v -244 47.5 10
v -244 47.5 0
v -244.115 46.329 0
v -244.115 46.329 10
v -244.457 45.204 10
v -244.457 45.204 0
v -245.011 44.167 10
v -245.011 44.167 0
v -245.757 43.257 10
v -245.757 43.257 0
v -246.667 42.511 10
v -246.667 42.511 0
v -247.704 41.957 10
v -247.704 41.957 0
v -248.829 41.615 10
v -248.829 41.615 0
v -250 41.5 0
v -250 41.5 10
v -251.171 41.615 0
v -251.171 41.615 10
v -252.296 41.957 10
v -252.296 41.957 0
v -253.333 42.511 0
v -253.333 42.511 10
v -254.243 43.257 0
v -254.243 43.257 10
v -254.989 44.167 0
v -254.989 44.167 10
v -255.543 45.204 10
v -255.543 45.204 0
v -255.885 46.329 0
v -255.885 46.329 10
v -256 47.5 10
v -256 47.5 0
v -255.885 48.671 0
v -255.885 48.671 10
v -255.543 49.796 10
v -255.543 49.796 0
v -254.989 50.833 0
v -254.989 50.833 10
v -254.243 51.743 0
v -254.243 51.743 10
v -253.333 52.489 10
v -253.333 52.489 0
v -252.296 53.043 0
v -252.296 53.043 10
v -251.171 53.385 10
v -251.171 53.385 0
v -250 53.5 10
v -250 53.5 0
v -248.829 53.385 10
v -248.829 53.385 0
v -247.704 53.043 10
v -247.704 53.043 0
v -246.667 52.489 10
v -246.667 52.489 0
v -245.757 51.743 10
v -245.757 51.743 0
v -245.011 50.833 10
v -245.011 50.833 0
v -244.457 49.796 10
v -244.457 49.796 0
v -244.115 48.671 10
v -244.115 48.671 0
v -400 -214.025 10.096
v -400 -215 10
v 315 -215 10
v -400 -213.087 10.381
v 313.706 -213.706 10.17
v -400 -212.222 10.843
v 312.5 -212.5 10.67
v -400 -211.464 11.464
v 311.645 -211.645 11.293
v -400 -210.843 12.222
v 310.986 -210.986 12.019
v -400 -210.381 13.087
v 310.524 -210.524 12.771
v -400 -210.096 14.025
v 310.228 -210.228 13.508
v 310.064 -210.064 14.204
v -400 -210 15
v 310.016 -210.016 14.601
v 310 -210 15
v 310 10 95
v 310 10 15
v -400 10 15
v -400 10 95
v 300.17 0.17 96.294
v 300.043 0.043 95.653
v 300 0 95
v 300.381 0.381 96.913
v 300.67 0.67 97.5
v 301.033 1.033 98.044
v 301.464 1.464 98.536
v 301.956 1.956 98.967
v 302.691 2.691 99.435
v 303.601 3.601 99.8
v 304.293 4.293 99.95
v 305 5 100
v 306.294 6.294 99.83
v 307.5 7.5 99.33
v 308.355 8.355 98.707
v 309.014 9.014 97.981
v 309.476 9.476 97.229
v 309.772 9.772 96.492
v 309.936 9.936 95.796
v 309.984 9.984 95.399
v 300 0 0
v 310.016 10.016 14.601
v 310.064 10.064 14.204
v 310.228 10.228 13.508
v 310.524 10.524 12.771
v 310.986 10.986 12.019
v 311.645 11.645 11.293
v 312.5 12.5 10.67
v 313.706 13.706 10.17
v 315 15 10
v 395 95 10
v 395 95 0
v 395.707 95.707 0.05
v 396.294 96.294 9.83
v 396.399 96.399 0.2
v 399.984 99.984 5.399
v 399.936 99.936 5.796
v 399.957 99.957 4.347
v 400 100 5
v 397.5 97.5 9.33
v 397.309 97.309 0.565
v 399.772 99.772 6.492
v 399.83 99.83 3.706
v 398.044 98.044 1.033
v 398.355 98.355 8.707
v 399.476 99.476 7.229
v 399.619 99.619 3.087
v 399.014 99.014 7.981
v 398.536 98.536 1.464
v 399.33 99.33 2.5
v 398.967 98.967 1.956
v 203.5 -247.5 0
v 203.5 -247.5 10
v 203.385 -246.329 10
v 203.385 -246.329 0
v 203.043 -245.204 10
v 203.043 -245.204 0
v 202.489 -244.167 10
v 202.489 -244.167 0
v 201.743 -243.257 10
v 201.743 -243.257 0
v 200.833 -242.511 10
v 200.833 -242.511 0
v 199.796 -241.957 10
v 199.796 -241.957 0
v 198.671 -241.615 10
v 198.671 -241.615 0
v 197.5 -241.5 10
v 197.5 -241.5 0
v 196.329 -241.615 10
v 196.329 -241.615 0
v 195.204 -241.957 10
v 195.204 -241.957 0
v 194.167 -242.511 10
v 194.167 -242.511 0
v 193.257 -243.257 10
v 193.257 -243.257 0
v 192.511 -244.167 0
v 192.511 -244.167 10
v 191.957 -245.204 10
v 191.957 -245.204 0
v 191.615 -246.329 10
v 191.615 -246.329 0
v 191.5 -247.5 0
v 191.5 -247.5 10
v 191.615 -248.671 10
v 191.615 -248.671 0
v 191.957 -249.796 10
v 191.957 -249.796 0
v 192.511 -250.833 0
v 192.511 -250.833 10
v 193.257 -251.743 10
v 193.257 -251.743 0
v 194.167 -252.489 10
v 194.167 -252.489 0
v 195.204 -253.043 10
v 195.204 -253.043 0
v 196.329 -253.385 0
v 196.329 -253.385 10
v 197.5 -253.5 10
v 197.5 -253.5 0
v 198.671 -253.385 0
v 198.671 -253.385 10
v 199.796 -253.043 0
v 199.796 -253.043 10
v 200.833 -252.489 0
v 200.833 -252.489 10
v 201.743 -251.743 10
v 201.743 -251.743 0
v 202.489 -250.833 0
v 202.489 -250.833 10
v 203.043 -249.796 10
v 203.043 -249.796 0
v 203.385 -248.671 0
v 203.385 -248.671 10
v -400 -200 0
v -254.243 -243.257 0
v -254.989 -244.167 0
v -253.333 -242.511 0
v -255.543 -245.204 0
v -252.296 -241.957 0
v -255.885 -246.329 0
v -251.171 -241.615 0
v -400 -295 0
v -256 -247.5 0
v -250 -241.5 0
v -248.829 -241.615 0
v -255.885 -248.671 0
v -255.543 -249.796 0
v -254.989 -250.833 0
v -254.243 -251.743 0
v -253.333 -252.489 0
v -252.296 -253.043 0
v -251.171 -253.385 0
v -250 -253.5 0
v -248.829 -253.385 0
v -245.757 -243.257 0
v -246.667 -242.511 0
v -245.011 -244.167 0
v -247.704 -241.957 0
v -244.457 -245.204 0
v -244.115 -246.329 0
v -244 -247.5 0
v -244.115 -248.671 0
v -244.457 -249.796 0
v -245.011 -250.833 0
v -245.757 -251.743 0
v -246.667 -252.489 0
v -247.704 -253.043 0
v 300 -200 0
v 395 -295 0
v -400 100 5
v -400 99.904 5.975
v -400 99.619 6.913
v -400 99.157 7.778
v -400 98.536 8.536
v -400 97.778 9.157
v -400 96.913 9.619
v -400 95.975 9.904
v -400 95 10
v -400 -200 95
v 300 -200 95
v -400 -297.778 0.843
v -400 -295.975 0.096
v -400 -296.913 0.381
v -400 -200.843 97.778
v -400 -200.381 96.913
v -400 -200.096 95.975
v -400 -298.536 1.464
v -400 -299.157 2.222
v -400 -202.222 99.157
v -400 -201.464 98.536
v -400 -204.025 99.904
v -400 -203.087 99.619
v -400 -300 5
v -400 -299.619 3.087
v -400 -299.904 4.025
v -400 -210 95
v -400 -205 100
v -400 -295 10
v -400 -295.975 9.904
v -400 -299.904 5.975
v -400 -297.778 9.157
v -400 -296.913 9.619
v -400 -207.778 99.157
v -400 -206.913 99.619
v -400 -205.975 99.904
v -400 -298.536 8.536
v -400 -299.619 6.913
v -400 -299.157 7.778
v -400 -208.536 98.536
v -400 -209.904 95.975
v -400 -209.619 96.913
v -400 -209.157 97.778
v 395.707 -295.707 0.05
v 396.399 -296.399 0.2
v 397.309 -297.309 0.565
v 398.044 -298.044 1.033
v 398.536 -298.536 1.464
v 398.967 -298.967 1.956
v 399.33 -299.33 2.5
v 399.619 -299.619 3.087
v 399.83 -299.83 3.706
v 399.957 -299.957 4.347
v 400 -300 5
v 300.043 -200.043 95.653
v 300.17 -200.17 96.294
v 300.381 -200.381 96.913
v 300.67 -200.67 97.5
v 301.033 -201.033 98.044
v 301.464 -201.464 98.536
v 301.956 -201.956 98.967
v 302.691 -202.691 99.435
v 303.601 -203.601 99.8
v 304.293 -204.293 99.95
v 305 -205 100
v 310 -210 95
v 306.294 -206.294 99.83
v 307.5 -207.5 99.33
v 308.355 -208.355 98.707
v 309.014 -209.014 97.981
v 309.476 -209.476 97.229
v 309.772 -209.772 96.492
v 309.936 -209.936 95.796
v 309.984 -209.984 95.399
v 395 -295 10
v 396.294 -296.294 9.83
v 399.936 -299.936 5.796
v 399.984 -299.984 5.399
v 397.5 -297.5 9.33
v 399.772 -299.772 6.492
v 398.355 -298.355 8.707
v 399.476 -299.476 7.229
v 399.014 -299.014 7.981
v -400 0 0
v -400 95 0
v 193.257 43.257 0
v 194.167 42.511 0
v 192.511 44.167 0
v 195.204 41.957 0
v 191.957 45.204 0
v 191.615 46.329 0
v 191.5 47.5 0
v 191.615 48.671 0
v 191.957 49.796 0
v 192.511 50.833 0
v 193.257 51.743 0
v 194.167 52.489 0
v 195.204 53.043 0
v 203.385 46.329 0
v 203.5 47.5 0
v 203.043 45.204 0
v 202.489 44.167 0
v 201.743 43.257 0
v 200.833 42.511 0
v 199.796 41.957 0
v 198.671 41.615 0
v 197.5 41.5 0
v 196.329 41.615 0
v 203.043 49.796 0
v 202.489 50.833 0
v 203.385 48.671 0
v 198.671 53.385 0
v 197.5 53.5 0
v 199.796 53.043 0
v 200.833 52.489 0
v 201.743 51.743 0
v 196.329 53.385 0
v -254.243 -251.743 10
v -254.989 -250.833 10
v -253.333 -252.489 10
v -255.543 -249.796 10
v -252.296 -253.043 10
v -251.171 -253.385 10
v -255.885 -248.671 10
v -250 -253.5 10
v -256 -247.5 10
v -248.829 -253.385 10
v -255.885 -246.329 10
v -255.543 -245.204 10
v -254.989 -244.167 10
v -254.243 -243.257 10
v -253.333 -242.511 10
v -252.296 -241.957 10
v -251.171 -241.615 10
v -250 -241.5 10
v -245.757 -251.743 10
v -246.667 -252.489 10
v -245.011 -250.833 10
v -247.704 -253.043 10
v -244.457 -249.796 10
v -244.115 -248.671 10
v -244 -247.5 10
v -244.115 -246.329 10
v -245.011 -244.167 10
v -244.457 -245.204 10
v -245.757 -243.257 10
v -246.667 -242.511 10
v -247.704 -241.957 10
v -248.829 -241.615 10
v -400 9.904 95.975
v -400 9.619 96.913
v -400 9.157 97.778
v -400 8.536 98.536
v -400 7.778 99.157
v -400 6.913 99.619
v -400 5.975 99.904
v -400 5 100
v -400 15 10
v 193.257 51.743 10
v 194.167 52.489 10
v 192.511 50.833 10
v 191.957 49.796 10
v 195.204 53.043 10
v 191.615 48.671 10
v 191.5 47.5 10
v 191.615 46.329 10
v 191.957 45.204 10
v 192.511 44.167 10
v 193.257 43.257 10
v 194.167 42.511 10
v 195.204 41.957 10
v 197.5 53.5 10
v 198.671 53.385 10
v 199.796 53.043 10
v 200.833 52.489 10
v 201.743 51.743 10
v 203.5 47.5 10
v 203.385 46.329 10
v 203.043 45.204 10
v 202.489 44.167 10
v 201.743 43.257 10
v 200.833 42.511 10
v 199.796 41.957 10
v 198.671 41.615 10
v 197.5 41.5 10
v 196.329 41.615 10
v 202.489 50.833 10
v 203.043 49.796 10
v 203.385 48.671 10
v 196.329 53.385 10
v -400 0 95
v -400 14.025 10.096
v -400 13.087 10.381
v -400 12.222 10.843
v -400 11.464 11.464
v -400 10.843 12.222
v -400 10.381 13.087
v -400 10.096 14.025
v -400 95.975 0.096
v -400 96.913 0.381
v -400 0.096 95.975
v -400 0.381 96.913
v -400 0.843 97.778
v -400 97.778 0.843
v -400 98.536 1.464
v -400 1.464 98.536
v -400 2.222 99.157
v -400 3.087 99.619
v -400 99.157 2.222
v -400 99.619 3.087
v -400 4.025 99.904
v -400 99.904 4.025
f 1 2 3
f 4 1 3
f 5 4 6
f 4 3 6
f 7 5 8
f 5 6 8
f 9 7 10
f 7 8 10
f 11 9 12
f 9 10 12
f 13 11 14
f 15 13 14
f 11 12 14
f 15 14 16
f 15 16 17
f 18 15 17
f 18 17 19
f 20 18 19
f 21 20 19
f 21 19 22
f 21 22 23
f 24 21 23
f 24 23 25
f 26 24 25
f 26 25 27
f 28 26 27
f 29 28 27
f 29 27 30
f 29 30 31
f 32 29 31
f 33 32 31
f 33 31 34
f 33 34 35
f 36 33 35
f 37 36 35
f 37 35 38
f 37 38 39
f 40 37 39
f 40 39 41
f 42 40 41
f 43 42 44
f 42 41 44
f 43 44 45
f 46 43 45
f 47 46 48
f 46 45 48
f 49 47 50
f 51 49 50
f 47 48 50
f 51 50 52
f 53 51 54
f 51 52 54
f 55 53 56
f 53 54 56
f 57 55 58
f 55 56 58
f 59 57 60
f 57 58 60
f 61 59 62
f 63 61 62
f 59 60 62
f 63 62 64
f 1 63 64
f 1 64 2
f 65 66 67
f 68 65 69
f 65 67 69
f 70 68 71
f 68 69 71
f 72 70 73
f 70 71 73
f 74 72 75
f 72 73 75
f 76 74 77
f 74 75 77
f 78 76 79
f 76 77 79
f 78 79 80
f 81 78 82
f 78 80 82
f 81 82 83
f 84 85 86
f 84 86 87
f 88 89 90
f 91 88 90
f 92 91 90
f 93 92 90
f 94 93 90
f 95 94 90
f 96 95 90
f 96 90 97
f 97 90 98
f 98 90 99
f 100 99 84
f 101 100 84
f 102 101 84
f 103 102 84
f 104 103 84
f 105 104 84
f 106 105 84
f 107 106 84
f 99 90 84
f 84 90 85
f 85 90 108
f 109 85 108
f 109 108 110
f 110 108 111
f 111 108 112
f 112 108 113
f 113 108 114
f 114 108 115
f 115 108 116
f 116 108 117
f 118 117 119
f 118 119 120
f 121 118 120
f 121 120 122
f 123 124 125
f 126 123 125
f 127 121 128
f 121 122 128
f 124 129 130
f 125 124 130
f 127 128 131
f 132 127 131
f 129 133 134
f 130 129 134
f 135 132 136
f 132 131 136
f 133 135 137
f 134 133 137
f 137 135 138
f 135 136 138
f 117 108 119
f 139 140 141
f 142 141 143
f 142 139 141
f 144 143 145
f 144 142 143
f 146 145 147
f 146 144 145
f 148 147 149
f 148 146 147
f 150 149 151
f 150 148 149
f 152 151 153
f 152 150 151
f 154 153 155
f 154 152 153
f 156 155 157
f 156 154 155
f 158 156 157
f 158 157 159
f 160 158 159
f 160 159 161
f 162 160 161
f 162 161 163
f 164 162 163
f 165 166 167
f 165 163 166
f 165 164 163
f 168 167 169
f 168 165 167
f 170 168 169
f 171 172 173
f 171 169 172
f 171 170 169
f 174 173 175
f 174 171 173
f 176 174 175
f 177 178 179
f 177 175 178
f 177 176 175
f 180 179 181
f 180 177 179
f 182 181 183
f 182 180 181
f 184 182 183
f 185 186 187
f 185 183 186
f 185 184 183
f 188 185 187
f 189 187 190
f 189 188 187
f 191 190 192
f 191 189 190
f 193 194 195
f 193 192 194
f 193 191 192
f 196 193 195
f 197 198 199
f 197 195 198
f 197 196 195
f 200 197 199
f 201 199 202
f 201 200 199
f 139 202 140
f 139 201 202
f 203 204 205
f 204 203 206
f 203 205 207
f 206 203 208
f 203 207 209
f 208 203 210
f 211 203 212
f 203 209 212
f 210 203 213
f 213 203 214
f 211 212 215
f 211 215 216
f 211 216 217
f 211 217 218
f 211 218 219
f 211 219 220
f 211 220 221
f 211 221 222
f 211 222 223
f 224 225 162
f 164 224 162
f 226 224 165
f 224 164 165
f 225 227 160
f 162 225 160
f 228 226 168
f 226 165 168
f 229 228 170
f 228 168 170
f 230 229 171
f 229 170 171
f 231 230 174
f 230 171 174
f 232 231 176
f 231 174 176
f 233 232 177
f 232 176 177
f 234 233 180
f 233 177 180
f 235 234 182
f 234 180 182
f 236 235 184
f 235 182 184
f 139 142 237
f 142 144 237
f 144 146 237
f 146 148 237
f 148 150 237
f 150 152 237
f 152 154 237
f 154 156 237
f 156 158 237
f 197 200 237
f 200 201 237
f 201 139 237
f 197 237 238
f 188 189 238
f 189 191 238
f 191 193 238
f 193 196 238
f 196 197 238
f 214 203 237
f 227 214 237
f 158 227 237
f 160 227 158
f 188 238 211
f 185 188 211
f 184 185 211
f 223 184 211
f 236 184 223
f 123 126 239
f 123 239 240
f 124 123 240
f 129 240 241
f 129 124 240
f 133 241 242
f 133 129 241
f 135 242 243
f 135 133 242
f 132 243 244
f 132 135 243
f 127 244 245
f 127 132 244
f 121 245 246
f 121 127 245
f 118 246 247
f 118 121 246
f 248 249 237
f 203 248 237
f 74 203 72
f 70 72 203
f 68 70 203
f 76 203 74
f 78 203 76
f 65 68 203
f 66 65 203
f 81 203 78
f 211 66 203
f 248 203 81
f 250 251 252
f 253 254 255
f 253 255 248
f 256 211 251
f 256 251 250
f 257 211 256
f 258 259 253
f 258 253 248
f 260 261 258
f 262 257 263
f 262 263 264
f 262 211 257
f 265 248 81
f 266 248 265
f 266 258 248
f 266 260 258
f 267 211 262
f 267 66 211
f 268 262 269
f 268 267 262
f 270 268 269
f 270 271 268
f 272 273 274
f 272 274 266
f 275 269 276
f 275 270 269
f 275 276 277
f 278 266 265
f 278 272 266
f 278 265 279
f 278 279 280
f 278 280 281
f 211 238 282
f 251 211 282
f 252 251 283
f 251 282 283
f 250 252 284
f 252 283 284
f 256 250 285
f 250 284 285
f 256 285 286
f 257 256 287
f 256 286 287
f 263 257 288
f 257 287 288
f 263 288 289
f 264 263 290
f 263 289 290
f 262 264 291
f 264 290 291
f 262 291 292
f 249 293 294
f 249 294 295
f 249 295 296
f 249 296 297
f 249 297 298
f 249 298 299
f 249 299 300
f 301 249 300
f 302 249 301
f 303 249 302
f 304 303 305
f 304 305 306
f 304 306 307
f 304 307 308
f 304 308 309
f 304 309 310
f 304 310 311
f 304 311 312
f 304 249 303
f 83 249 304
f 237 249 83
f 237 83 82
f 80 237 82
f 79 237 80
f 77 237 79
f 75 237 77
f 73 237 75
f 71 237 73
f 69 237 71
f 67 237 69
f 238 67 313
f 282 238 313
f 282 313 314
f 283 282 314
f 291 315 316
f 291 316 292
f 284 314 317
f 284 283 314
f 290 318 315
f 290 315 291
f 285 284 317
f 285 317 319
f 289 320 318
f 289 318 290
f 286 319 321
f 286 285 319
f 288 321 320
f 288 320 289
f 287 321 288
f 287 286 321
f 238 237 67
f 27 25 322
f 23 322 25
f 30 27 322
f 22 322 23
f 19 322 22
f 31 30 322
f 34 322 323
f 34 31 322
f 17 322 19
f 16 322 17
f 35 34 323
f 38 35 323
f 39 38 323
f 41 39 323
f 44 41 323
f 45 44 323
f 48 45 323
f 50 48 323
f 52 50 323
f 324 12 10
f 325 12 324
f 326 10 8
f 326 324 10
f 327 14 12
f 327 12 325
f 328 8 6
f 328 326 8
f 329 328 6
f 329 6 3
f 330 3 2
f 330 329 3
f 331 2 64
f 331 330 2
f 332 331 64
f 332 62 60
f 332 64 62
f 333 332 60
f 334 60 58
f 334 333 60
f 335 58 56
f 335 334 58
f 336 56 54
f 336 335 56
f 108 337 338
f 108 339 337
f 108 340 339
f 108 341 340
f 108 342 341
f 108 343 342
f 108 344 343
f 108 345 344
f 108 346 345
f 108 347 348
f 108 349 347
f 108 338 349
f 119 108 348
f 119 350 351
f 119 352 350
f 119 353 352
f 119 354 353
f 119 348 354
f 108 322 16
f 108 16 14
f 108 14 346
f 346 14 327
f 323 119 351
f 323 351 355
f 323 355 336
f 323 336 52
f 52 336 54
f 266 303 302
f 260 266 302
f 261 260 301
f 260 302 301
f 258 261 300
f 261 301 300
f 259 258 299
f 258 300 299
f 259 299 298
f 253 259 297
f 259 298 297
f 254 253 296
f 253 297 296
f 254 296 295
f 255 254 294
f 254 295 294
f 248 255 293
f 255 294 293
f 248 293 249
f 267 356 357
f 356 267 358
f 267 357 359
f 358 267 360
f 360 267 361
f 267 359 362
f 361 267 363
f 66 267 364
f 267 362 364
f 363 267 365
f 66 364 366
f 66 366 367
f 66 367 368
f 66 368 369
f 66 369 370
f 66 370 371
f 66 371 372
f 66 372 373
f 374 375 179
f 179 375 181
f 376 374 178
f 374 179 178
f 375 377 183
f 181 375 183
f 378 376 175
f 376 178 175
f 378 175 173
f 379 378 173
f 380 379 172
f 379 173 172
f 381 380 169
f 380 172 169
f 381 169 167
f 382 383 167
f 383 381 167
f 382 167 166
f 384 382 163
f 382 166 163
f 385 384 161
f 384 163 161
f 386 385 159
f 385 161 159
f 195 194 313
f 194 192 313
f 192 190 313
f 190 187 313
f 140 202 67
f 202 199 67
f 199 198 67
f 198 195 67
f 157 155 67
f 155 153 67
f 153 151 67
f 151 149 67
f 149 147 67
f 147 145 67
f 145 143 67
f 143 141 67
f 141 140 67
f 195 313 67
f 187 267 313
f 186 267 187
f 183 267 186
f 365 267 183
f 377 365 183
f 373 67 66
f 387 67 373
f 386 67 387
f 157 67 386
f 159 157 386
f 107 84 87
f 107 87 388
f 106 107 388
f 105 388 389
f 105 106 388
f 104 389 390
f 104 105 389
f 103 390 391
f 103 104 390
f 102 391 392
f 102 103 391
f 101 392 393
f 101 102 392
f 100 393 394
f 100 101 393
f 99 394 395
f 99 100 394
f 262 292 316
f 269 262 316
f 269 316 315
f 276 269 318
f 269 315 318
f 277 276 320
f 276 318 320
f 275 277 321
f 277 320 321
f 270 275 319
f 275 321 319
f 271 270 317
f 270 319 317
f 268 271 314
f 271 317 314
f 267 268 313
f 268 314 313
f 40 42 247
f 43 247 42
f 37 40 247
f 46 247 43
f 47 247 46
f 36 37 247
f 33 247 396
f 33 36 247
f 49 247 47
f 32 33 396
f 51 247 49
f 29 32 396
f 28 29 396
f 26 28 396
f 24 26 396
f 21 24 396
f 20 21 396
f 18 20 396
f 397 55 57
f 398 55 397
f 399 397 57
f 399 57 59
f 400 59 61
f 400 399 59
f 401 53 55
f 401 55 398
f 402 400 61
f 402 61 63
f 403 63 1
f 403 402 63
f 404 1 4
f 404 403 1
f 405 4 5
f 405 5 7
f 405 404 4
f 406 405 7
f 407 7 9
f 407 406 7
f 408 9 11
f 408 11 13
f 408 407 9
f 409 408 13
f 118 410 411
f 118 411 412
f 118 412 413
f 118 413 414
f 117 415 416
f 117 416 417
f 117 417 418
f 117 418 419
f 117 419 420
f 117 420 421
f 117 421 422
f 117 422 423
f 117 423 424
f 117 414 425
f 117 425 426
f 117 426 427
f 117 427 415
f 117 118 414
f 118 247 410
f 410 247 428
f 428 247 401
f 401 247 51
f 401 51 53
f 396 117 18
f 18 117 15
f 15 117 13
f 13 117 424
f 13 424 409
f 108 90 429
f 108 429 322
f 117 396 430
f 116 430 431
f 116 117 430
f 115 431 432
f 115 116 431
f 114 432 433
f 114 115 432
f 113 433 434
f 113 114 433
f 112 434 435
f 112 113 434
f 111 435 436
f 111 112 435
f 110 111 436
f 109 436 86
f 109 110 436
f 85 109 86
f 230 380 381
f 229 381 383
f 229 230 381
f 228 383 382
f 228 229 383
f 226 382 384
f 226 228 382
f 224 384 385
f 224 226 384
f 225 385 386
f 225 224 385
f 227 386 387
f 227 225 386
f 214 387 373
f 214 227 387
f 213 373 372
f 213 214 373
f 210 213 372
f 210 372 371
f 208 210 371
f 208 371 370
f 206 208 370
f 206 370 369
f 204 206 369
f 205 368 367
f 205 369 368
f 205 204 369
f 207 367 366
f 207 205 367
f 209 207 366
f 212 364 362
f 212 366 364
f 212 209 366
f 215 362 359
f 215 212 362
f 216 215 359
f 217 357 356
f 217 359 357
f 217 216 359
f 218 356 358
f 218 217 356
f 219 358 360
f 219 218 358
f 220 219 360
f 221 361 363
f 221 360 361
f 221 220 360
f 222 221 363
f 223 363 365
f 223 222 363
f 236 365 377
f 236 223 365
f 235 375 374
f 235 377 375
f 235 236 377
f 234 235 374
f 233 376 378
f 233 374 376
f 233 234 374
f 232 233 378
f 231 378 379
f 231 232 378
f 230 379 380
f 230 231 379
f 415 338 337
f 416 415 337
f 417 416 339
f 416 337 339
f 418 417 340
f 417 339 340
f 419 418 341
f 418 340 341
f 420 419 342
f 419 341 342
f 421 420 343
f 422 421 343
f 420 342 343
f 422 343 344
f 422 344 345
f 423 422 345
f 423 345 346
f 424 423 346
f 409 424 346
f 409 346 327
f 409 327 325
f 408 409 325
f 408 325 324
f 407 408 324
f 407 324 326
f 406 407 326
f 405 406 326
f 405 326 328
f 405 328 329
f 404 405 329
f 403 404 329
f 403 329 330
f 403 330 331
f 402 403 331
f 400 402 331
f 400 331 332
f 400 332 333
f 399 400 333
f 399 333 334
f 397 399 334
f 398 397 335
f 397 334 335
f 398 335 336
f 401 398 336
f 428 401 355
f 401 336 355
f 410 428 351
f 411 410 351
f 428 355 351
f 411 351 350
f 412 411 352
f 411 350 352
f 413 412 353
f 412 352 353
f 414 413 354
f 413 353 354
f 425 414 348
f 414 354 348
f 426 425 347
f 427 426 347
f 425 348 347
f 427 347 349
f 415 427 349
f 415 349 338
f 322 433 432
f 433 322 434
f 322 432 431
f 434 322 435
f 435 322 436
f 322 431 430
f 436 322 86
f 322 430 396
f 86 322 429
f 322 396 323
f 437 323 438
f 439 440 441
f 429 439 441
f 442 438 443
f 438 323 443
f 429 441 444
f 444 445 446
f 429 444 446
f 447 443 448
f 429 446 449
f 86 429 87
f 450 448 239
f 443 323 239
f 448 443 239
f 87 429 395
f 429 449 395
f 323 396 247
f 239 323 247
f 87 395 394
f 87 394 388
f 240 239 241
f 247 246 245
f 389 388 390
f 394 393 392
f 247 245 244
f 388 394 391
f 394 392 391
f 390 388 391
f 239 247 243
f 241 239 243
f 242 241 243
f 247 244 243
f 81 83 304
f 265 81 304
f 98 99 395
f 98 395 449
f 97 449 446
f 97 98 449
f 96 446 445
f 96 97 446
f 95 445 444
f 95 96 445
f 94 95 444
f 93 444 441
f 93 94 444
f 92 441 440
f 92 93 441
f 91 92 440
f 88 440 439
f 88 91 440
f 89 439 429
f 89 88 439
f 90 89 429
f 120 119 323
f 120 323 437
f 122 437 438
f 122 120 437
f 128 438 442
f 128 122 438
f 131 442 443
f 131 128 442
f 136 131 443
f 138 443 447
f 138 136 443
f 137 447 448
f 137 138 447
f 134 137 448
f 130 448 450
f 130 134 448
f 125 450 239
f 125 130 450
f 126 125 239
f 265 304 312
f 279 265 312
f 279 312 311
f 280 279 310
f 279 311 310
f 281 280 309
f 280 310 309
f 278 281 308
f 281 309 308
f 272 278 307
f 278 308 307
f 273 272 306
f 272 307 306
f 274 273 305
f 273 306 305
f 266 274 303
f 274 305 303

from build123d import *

# Parameters (mm, degrees)
F1_DEPTH = 400
F3_DEPTH = 100.001
F6_R     = 6
F7_DEPTH = 100.001
F9_DEPTH = 100.001


with BuildPart() as f1:
    # F0 (on Right) → F1 (new body, symmetric)
    with BuildSketch(Plane.YZ):
        with BuildLine():
            ThreePointArc((5, 100), (1.464466, 98.535534), (0, 95))
            Line((0, 95), (0, 0))
            Line((0, 0), (95, 0))
            ThreePointArc((95, 0), (98.535534, 1.464466), (100, 5))
            ThreePointArc((100, 5), (98.535534, 8.535534), (95, 10))
            Line((95, 10), (15, 10))
            ThreePointArc((15, 10), (11.464466, 11.464466), (10, 15))
            Line((10, 15), (10, 95))
            ThreePointArc((10, 95), (8.535534, 98.535534), (5, 100))
        make_face()
    extrude(amount=F1_DEPTH, both=True)

    # F2 (on face) → F3 (cut, through all)
    with BuildSketch(Plane(origin=(0, 0, 0), x_dir=(1, 0, 0), z_dir=(0, 0, -1))):
        Polygon((395, -95), (400, -95), (400, 0), (300, 0), align=None)
        Polygon((395, -95), (400, -100), (400, -95), align=None)
    extrude(amount=-F3_DEPTH, mode=Mode.SUBTRACT)

    # F6 (on face) → F7 (cut, through all)
    with BuildSketch(Plane(origin=(0, 0, 0), x_dir=(1, 0, 0), z_dir=(0, 0, -1))):
        with Locations((-250, -47.5)):
            Circle(F6_R)
        with Locations((197.5, -47.5)):
            Circle(F6_R)
    extrude(amount=-F7_DEPTH, mode=Mode.SUBTRACT)


with BuildPart() as f5_1:
    # F5: instance of F1
    add(f1.part.mirror(Plane.XZ.offset(100)))

    # F8 (on face) → F9 (cut, through all)
    with BuildSketch(Plane(origin=(0, 0, 0), x_dir=(1, 0, 0), z_dir=(0, 0, -1))):
        with BuildLine():
            ThreePointArc((-244, 247.5), (-250, 253.5), (-256, 247.5))
            Line((-256, 247.5), (-250, 247.5))
            Line((-250, 247.5), (-244, 247.5))
        make_face()
        with BuildLine():
            ThreePointArc((203.5, 247.5), (197.5, 253.5), (191.5, 247.5))
            Line((191.5, 247.5), (197.5, 247.5))
            Line((197.5, 247.5), (203.5, 247.5))
        make_face()
        with BuildLine():
            Line((197.5, 247.5), (191.5, 247.5))
            ThreePointArc((191.5, 247.5), (197.5, 241.5), (203.5, 247.5))
            Line((203.5, 247.5), (197.5, 247.5))
        make_face()
        with BuildLine():
            Line((-250, 247.5), (-256, 247.5))
            ThreePointArc((-256, 247.5), (-250, 241.5), (-244, 247.5))
            Line((-244, 247.5), (-250, 247.5))
        make_face()
    extrude(amount=-F9_DEPTH, mode=Mode.SUBTRACT)


solid = Compound([f1.part, f5_1.part])
